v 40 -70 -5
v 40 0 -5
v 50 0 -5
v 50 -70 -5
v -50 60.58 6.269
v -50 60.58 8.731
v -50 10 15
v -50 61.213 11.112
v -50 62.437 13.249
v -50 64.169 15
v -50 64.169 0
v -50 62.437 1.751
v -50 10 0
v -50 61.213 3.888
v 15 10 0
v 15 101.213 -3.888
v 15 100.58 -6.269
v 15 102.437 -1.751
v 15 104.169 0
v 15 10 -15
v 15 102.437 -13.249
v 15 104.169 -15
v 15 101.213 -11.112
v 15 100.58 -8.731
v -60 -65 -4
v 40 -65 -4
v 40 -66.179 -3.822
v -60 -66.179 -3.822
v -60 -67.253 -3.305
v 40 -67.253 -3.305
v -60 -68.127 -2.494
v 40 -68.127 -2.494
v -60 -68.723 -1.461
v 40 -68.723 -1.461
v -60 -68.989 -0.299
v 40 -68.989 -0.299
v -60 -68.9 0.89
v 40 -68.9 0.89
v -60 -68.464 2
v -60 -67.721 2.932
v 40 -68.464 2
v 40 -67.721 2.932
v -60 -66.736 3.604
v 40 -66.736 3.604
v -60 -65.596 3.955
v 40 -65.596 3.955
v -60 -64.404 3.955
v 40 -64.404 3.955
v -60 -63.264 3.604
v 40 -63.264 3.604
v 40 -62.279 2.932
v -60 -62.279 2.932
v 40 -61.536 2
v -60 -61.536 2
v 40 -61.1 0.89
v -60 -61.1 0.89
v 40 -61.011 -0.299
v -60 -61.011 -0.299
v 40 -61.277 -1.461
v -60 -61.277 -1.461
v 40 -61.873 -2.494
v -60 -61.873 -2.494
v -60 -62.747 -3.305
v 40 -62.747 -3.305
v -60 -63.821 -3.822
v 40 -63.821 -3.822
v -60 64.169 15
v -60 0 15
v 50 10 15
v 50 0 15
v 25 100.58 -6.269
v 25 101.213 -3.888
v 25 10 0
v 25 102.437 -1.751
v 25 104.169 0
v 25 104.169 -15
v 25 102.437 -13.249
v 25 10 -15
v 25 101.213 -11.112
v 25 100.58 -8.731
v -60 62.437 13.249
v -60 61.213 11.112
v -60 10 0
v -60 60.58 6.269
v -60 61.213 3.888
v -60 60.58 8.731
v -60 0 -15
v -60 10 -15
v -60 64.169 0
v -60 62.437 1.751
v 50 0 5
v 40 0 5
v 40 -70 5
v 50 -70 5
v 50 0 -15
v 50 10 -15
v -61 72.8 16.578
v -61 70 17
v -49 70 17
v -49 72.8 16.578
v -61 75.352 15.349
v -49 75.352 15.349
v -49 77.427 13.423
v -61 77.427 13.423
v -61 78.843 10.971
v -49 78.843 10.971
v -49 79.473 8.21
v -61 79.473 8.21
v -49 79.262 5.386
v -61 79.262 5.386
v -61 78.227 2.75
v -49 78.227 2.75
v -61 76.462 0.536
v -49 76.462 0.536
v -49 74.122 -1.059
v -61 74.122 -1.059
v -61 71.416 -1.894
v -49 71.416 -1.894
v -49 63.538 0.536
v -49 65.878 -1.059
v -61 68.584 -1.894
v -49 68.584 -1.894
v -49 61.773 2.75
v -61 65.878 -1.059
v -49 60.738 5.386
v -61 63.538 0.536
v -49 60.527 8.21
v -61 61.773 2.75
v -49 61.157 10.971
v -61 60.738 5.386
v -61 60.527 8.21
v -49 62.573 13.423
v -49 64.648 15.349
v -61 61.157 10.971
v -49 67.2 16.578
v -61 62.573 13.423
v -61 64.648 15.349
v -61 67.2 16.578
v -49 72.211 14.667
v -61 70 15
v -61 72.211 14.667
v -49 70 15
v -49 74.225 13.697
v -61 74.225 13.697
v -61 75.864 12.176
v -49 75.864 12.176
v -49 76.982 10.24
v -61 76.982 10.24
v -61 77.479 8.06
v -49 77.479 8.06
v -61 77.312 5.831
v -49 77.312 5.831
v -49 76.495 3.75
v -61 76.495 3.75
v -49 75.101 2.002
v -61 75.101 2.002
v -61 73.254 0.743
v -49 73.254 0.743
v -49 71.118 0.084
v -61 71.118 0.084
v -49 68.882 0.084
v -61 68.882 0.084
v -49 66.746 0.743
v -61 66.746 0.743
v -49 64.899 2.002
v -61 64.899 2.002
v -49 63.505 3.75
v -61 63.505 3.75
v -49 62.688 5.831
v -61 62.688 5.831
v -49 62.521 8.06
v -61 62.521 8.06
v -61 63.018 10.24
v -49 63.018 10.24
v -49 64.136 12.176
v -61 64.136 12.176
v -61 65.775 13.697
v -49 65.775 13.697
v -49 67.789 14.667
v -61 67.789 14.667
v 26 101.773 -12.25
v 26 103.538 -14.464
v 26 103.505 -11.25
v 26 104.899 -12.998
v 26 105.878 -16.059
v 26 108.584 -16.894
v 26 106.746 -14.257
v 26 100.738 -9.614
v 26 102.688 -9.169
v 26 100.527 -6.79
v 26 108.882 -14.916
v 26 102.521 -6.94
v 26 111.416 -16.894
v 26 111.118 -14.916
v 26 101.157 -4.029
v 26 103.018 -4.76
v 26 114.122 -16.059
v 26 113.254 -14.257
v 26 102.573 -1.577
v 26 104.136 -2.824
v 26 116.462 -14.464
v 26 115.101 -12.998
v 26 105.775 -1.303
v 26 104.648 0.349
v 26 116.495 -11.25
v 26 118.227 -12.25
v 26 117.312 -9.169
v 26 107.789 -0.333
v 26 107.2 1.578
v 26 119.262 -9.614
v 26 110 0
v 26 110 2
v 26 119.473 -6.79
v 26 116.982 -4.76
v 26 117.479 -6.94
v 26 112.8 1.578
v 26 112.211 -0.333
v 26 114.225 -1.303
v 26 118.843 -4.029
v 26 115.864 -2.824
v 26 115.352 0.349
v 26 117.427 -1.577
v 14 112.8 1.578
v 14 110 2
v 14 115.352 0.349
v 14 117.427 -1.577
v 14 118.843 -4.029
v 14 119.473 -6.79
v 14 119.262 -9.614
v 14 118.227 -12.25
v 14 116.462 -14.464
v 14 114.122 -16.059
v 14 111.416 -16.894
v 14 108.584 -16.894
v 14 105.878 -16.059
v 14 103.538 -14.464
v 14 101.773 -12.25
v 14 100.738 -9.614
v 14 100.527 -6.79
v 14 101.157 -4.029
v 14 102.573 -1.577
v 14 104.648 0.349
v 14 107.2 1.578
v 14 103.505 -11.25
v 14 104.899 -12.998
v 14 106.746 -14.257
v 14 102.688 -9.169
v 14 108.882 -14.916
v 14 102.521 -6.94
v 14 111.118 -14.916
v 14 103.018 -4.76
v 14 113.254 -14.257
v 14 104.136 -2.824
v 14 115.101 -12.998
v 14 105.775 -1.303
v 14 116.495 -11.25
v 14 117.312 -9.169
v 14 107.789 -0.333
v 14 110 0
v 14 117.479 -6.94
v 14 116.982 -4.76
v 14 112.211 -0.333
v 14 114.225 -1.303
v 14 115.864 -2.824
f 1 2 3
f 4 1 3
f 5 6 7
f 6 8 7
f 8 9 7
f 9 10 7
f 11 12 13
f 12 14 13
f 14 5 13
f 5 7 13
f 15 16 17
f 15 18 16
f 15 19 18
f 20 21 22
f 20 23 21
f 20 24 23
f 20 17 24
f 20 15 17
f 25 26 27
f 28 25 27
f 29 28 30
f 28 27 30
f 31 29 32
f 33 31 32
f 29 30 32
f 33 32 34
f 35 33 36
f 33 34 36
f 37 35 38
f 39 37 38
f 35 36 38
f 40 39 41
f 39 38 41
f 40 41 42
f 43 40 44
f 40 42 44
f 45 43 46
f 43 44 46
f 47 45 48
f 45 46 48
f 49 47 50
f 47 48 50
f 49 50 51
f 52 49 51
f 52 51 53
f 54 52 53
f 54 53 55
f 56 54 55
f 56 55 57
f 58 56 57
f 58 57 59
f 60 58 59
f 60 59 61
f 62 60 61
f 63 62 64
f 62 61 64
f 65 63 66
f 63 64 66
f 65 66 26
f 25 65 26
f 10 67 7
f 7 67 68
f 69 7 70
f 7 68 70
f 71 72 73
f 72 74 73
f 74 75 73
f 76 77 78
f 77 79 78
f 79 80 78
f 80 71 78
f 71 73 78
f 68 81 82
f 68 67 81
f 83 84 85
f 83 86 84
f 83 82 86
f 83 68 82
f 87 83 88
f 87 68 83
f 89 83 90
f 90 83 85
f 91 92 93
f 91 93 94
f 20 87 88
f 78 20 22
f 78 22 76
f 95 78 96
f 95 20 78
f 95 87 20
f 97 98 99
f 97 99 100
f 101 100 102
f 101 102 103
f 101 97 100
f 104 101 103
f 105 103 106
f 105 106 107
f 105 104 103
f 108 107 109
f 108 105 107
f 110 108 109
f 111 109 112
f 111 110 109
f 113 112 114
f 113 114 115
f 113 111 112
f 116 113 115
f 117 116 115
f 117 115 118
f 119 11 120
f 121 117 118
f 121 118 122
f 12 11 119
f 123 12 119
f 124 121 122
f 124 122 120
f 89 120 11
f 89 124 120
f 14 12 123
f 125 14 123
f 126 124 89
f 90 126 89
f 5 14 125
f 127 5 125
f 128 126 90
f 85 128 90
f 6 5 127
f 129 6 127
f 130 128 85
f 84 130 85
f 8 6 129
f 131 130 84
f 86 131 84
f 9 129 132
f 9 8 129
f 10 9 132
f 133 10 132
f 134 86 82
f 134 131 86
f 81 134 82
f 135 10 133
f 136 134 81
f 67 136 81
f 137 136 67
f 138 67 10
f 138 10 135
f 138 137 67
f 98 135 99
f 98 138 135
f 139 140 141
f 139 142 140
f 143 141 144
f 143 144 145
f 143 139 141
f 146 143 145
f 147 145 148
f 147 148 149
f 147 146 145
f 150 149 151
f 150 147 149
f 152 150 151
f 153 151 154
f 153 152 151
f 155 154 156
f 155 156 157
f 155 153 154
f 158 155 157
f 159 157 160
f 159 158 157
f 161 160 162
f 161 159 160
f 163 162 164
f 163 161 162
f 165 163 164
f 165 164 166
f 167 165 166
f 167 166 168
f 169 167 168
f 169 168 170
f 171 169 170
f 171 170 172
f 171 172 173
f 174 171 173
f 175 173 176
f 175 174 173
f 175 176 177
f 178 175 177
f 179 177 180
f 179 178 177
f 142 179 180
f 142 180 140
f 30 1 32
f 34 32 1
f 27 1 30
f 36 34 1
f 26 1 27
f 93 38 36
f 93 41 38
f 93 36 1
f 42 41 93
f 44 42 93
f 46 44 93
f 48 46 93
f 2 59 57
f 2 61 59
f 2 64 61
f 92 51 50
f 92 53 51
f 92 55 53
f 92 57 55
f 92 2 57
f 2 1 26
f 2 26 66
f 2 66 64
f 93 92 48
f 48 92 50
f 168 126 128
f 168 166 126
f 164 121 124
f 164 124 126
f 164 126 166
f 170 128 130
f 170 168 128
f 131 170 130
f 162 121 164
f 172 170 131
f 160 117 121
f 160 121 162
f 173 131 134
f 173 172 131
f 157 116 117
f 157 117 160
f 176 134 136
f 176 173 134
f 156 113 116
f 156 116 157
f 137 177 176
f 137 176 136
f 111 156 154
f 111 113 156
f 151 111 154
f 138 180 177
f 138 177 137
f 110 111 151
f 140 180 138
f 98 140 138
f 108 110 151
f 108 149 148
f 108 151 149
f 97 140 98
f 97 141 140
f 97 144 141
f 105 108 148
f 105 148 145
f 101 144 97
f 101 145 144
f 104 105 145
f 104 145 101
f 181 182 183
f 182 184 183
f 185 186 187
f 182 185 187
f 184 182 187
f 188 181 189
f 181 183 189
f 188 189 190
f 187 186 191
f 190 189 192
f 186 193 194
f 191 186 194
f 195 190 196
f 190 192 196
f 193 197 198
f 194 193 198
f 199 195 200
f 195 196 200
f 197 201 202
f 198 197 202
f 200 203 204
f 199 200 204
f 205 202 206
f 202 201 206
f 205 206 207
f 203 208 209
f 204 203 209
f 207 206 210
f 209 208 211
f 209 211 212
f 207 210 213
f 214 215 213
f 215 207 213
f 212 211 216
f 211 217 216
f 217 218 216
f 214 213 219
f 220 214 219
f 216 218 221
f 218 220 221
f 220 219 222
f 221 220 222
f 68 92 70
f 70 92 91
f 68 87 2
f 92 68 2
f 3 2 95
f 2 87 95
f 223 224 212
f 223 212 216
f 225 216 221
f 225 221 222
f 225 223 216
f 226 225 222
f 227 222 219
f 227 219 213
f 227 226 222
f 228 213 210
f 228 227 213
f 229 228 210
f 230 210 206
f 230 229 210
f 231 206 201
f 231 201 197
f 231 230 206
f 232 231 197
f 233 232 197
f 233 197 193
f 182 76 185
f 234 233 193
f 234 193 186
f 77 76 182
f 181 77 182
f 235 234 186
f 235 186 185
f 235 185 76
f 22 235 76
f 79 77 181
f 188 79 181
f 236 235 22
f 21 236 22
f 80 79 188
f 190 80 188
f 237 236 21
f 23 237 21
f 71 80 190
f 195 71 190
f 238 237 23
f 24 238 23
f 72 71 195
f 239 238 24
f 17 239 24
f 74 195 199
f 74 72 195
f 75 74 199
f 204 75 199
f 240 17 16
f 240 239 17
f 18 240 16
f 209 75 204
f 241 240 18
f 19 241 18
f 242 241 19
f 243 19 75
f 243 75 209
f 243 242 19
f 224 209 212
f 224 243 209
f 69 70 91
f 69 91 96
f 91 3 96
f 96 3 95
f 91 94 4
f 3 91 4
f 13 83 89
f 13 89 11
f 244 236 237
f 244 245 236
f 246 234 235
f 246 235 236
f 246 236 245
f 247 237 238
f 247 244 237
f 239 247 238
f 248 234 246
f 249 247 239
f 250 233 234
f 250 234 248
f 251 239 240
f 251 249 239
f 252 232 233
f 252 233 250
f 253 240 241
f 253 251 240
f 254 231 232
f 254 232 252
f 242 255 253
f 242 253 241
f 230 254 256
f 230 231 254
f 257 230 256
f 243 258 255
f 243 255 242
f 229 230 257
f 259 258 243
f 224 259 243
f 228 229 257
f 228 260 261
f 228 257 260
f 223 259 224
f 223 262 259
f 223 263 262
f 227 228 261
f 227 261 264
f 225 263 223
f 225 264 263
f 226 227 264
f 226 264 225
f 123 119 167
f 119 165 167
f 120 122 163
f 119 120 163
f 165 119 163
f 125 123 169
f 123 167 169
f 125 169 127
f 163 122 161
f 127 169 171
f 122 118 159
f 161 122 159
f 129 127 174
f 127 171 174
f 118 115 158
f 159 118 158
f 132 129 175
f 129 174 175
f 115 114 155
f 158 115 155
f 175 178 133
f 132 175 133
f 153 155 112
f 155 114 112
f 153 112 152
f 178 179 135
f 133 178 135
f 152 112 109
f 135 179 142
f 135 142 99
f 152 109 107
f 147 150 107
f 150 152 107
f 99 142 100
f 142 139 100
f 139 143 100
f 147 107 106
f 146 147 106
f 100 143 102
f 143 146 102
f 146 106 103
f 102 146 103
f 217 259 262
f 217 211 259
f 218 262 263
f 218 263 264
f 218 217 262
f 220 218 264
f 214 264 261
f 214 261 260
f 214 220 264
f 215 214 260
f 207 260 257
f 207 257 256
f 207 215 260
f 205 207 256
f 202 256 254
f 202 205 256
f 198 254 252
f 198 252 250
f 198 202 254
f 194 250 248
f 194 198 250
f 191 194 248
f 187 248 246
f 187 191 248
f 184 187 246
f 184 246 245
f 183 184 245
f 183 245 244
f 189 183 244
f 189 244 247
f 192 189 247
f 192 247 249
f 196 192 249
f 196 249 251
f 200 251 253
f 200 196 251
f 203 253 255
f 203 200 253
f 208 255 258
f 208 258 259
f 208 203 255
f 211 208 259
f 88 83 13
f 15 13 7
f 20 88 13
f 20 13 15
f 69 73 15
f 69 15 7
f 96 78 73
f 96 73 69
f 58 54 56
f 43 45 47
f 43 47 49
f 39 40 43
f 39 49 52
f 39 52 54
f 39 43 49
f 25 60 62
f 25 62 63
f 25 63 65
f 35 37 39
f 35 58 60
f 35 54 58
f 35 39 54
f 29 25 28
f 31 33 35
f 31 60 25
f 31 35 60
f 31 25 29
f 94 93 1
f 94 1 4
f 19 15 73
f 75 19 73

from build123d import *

# Parameters (mm, degrees)
SKETCH2_W            = 110
SKETCH2_H            = 30
BOSS_EXTRUDE2_DEPTH  = 10
SKETCH15_W           = 10
SKETCH15_H           = 15
BOSS_EXTRUDE9_DEPTH  = 60
SKETCH17_R           = 9.5
SKETCH17_R_2         = 7.5
EXTRUDE_THIN3_DEPTH  = 6
CUT_EXTRUDE4_START   = -5
CUT_EXTRUDE4_DEPTH   = 10
SKETCH19_W           = 10
SKETCH19_H           = 15
BOSS_EXTRUDE11_DEPTH = 100
SKETCH20_R           = 9.5
SKETCH20_R_2         = 7.5
EXTRUDE_THIN4_DEPTH  = 6
CUT_EXTRUDE5_START   = -5
CUT_EXTRUDE5_DEPTH   = 10
SKETCH21_W           = 10
SKETCH21_H           = 10
BOSS_EXTRUDE12_DEPTH = 70
SKETCH22_R           = 4
BOSS_EXTRUDE13_DEPTH = 100


# Read off the part's stored shape, not the designer's step: Cut-Extrude4, Cut-Extrude5
with BuildPart() as part:
    # Sketch2 → Boss-Extrude2 (new body)
    with BuildSketch(Plane(origin=(0, 0, 0), x_dir=(1, 0, 0), z_dir=(0, 1, 0))):
        with Locations((-5, 0)):
            Rectangle(SKETCH2_W, SKETCH2_H)
    extrude(amount=BOSS_EXTRUDE2_DEPTH)

    # Sketch15 → Boss-Extrude9 (add)
    with BuildSketch(Plane(origin=(0, 10, 0), x_dir=(1, 0, 0), z_dir=(0, 1, 0))):
        with Locations((-55, -7.5)):
            Rectangle(SKETCH15_W, SKETCH15_H)
    extrude(amount=BOSS_EXTRUDE9_DEPTH)

    # Sketch17 → Extrude-Thin3 (add, symmetric)
    with BuildSketch(Plane.ZY.offset(55)):
        with Locations((7.5, 70)):
            Circle(SKETCH17_R)
        with Locations((7.5, 70)):
            Circle(SKETCH17_R_2, mode=Mode.SUBTRACT)
    extrude(amount=EXTRUDE_THIN3_DEPTH, both=True)

    # Cut-Extrude4 outline → Cut-Extrude4 (cut)
    with BuildSketch(Plane.ZY.offset(55).offset(CUT_EXTRUDE4_START)):
        with BuildLine():
            ThreePointArc((0, 70), (7.5, 62.5), (15, 70))
            Line((15, 70), (0, 70))
        make_face()
    extrude(amount=CUT_EXTRUDE4_DEPTH, mode=Mode.SUBTRACT)

    # Sketch19 → Boss-Extrude11 (add)
    with BuildSketch(Plane(origin=(0, 10, 0), x_dir=(1, 0, 0), z_dir=(0, 1, 0))):
        with Locations((20, 7.5)):
            Rectangle(SKETCH19_W, SKETCH19_H)
    extrude(amount=BOSS_EXTRUDE11_DEPTH)

    # Sketch20 → Extrude-Thin4 (add, symmetric)
    with BuildSketch(Plane.ZY.offset(-20)):
        with Locations((-7.5, 110)):
            Circle(SKETCH20_R)
        with Locations((-7.5, 110)):
            Circle(SKETCH20_R_2, mode=Mode.SUBTRACT)
    extrude(amount=EXTRUDE_THIN4_DEPTH, both=True)

    # Cut-Extrude5 outline → Cut-Extrude5 (cut)
    with BuildSketch(Plane.ZY.offset(-20).offset(CUT_EXTRUDE5_START)):
        with BuildLine():
            ThreePointArc((-15, 110), (-7.5, 102.5), (0, 110))
            Line((0, 110), (-15, 110))
        make_face()
    extrude(amount=CUT_EXTRUDE5_DEPTH, mode=Mode.SUBTRACT)

    # Sketch21 → Boss-Extrude12 (add)
    with BuildSketch(Plane.XZ):
        with Locations((45, 0)):
            Rectangle(SKETCH21_W, SKETCH21_H)
    extrude(amount=BOSS_EXTRUDE12_DEPTH)

    # Sketch22 → Boss-Extrude13 (add)
    with BuildSketch(Plane.ZY.offset(-40)):
        with Locations(Location((0, -65, 0), (0, 0, 180))):
            Circle(SKETCH22_R)
    extrude(amount=BOSS_EXTRUDE13_DEPTH)


solid = part.part
